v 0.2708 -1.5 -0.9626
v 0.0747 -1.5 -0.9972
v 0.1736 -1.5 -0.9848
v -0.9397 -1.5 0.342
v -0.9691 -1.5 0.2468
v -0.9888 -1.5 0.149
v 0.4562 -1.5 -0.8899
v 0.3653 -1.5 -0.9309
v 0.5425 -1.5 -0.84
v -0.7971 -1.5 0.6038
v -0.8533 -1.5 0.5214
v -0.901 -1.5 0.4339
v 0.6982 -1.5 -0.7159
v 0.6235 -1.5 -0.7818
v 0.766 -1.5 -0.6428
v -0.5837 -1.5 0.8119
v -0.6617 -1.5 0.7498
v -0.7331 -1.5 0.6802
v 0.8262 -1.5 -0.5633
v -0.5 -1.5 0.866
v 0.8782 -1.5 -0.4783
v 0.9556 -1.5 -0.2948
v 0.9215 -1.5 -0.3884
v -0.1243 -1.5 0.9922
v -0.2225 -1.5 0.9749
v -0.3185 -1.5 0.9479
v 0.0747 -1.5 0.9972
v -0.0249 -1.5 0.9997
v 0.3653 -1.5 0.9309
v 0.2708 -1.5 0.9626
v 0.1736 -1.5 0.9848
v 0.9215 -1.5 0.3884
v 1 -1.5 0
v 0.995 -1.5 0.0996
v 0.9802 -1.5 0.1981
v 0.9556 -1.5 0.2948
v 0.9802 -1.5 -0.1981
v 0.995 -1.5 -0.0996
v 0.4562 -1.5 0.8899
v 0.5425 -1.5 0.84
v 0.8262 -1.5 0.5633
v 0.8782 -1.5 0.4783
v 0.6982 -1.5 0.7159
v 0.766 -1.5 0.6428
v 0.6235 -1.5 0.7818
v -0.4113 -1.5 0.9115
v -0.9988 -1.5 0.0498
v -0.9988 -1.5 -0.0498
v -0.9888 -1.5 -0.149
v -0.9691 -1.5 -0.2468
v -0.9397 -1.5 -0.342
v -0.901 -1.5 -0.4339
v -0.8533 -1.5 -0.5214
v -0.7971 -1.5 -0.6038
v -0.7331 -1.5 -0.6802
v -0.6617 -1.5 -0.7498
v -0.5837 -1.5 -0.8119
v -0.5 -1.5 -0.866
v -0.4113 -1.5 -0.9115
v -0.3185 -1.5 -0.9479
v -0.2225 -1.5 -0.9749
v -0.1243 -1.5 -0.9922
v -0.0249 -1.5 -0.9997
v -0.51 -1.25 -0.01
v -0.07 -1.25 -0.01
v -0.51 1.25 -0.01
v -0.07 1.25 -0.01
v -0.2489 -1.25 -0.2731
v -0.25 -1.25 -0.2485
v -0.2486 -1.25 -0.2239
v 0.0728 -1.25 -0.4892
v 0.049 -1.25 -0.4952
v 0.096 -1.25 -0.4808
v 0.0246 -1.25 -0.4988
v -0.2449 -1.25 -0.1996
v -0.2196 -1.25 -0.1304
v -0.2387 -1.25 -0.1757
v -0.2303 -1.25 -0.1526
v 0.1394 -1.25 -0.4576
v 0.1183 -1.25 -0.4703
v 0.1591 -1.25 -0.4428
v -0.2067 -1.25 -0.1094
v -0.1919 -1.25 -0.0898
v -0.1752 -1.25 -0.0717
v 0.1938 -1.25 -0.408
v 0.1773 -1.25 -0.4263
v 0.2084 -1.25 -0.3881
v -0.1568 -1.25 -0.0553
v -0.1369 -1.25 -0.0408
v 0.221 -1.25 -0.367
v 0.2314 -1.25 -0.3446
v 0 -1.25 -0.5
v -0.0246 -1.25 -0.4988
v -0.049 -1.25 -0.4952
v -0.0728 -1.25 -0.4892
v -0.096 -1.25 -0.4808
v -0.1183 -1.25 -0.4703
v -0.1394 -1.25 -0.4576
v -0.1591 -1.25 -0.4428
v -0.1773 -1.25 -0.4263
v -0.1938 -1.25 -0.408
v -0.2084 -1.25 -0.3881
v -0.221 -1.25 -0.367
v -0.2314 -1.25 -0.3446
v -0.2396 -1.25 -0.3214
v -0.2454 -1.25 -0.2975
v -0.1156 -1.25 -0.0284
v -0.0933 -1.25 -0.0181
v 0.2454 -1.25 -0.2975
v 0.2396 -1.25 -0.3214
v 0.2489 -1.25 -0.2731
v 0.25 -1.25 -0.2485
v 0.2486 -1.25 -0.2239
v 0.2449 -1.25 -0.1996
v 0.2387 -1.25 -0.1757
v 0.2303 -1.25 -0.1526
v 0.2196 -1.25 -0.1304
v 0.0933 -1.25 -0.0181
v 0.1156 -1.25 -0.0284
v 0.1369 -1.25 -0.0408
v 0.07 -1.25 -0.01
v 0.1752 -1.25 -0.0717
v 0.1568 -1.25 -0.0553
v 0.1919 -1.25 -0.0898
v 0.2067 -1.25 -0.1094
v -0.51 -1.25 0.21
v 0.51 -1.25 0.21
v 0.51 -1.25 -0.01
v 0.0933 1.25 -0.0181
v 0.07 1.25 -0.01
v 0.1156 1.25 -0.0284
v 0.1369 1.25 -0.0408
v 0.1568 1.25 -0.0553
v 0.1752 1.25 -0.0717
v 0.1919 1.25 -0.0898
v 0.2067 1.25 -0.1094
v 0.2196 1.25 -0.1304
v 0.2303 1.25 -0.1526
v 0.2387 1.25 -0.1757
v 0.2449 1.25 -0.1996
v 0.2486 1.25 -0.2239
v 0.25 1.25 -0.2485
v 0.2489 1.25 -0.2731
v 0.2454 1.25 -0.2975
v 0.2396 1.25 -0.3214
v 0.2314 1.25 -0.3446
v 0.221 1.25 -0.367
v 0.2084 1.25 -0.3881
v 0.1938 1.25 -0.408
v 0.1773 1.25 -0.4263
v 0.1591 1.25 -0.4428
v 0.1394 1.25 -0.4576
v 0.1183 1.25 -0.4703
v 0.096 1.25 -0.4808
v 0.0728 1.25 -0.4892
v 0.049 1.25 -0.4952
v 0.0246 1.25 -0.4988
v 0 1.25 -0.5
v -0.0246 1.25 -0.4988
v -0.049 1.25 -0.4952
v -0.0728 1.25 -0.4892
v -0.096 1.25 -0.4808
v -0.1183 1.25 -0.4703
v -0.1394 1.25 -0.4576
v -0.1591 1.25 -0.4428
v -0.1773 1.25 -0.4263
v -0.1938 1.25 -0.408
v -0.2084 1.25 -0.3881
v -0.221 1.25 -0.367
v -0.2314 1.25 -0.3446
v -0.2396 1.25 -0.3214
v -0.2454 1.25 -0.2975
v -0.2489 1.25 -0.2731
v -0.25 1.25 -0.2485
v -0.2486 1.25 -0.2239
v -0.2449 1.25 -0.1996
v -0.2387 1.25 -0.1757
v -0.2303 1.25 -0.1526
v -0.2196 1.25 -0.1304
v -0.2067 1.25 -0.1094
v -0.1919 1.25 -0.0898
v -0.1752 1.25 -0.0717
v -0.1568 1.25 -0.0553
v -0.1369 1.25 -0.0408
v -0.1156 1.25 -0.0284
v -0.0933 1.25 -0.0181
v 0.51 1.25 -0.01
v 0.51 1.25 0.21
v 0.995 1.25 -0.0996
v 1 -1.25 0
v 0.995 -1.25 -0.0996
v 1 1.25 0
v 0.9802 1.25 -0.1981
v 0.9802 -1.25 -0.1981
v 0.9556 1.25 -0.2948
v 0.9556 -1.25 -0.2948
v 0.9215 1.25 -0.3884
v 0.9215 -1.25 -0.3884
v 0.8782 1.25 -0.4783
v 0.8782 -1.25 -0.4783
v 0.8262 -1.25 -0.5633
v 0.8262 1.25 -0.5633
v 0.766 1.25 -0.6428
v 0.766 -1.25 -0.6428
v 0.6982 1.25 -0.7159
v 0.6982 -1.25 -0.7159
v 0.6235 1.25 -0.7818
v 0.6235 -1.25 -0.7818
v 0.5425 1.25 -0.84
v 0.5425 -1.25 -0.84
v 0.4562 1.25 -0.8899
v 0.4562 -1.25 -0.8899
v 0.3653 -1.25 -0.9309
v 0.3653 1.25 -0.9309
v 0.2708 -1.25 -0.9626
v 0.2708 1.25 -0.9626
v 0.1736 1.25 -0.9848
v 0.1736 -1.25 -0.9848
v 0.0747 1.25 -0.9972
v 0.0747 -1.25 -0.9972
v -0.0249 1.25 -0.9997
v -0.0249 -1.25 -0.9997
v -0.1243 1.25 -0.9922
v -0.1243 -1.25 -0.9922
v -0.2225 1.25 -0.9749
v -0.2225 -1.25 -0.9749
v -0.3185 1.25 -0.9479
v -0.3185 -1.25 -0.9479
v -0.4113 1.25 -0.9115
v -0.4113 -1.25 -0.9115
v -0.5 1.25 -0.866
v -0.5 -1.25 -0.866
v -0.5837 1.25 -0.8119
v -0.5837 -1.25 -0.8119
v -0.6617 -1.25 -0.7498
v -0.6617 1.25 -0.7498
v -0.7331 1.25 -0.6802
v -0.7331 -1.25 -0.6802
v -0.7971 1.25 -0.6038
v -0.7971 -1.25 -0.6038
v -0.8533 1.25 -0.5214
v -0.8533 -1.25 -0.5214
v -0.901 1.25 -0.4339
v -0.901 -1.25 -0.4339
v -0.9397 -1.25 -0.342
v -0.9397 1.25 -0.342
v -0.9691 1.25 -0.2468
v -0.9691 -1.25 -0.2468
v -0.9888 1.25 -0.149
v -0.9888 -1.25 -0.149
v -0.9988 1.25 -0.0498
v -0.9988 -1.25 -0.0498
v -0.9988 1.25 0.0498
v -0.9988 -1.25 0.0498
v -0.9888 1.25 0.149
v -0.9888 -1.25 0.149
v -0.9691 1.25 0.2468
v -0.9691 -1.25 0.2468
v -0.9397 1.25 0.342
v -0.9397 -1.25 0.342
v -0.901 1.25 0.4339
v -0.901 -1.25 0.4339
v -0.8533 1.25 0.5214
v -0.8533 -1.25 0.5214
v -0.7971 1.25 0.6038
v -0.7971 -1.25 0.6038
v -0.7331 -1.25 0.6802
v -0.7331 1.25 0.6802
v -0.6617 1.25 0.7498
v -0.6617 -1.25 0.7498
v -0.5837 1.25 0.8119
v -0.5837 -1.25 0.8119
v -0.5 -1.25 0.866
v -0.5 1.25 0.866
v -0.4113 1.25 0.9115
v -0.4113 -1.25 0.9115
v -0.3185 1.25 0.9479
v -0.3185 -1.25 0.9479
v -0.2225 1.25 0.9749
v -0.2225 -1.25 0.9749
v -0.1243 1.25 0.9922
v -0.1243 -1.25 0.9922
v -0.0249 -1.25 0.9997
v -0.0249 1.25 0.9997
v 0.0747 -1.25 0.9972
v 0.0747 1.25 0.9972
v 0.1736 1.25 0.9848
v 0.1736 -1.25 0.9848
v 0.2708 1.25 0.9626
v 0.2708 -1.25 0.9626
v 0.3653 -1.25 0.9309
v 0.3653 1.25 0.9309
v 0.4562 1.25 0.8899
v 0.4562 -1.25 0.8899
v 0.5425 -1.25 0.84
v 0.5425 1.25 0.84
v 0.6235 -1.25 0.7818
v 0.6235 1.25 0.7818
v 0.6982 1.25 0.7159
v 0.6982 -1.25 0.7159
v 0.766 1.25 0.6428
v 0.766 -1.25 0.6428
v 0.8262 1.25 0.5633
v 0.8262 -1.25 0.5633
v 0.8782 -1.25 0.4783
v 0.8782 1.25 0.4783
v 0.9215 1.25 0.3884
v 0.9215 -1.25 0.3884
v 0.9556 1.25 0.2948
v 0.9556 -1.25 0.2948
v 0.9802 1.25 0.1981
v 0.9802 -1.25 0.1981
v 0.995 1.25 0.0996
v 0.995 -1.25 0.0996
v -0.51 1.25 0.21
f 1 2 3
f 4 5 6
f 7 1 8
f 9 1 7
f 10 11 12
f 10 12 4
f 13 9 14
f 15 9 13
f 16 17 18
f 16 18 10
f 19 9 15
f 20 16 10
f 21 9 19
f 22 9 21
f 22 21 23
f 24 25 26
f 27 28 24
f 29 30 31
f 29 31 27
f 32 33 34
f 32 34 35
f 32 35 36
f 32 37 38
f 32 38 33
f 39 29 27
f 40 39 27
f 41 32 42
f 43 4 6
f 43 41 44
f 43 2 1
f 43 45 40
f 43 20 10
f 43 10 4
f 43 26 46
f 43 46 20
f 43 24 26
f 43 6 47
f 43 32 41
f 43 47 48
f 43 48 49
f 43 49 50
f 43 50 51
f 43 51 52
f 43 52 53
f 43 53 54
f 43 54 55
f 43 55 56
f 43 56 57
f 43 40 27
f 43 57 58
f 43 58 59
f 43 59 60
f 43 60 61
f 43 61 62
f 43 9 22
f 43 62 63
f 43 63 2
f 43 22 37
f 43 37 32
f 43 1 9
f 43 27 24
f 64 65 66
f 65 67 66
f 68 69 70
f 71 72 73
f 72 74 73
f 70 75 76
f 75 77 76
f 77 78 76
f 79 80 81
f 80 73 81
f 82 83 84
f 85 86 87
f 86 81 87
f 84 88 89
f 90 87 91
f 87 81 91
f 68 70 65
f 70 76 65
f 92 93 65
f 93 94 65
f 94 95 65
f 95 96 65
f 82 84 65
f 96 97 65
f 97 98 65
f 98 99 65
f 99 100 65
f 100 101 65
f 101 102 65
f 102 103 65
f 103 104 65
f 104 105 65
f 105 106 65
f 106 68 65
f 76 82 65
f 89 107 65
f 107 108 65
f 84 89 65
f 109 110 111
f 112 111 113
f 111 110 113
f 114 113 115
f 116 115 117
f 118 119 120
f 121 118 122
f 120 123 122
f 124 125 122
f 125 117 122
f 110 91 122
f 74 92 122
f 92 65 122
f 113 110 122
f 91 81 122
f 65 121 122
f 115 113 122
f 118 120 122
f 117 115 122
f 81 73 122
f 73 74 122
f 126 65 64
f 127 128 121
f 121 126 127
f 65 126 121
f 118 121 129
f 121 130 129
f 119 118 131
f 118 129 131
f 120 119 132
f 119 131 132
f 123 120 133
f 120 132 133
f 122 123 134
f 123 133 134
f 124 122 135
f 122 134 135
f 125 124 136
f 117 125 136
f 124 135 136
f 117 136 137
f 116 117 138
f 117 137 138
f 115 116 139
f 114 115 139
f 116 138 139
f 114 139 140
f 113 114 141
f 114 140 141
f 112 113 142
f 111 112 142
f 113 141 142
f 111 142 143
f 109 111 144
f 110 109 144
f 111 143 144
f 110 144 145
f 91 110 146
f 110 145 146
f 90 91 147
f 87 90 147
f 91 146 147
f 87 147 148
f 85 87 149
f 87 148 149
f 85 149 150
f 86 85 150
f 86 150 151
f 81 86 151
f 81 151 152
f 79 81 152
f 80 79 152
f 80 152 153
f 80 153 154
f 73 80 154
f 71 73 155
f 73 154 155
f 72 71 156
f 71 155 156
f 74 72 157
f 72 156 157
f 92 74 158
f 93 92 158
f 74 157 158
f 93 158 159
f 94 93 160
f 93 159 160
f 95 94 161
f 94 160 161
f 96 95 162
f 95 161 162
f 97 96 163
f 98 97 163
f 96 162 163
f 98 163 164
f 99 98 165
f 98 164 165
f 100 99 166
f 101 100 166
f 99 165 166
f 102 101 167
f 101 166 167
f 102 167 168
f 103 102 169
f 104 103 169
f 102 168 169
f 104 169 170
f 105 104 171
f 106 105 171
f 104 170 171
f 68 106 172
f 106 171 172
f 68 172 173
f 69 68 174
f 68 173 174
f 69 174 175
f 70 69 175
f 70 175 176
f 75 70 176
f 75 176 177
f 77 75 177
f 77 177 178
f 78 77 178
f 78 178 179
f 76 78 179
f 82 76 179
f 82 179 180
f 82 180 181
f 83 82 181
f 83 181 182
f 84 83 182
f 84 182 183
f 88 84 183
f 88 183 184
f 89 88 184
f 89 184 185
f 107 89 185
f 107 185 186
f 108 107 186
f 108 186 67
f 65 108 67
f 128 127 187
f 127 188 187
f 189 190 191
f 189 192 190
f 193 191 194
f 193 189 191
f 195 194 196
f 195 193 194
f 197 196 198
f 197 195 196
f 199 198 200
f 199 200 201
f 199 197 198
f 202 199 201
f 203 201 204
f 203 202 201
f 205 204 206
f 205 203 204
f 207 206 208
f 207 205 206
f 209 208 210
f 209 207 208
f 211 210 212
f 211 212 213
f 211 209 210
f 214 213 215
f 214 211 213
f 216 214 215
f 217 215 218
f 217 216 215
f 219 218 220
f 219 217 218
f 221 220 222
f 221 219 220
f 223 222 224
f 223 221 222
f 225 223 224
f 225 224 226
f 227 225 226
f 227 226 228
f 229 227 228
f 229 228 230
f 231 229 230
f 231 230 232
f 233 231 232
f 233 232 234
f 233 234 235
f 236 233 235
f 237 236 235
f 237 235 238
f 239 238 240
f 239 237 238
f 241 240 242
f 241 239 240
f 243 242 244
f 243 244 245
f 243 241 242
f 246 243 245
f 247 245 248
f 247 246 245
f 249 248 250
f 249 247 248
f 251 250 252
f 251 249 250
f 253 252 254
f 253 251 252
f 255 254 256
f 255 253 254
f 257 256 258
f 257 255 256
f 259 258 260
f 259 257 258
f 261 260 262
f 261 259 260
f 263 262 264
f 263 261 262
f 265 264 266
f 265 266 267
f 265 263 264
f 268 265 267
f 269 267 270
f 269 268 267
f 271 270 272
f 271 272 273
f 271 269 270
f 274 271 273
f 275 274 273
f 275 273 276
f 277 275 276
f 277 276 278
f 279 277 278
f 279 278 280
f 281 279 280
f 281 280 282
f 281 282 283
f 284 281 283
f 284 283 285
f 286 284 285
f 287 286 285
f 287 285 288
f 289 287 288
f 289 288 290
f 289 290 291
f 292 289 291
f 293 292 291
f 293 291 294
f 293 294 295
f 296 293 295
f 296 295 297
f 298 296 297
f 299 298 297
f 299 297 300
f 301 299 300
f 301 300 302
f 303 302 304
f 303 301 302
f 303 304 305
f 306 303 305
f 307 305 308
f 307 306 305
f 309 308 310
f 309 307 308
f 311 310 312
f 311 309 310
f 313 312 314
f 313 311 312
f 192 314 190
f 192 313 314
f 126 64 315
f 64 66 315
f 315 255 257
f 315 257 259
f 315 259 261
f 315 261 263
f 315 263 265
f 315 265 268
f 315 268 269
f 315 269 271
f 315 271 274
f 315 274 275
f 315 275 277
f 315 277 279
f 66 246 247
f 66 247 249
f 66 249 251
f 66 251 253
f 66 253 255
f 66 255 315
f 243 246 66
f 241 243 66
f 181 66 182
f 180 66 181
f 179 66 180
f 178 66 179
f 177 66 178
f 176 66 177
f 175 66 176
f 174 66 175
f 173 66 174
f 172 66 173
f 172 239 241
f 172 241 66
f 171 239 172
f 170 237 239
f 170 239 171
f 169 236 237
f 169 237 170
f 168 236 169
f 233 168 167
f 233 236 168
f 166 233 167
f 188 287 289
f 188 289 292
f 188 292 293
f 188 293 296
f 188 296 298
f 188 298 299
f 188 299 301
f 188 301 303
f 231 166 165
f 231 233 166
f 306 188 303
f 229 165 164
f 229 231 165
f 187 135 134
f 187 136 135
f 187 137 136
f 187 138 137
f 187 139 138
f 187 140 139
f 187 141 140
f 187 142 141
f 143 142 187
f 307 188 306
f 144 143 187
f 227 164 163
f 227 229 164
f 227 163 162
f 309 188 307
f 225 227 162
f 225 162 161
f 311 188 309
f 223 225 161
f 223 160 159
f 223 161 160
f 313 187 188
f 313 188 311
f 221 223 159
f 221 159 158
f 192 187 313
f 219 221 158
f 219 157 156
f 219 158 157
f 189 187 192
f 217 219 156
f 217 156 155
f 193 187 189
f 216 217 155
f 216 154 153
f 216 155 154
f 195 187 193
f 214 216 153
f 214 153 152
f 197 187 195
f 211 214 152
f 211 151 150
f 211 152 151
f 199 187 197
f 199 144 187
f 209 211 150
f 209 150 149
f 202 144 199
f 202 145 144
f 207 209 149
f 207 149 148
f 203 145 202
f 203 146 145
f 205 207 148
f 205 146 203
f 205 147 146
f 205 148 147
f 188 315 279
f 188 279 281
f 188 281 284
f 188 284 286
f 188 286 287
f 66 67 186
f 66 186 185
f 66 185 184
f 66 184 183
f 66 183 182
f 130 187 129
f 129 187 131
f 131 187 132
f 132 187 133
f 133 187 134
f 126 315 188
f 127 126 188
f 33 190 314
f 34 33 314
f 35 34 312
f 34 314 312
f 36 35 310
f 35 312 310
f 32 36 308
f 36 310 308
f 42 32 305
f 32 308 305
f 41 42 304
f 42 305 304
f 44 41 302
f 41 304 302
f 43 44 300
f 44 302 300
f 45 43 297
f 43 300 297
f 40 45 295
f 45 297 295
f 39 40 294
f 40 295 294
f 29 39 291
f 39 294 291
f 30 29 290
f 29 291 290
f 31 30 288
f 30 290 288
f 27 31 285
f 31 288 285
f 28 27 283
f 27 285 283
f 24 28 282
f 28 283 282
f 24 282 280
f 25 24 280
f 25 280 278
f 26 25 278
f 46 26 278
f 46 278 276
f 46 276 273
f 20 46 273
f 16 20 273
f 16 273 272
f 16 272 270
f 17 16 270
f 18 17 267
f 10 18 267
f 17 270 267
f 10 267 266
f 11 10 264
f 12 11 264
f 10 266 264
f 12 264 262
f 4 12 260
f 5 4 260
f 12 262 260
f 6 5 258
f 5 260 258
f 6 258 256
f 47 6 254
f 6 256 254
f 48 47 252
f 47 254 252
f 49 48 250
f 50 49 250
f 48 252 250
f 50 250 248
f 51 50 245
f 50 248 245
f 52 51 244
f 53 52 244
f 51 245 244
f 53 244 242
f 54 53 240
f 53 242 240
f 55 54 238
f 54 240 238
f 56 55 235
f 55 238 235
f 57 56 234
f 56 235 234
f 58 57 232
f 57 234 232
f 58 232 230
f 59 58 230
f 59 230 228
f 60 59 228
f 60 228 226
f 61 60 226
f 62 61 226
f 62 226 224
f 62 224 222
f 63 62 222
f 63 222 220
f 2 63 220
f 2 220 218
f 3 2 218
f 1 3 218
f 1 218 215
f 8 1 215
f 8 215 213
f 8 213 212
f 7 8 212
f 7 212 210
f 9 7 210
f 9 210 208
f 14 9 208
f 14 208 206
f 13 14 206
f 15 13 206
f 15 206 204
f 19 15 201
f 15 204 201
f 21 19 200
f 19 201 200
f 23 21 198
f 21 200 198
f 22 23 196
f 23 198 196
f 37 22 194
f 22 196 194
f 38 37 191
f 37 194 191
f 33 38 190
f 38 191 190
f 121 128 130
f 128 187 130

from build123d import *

# Parameters (mm, degrees)
SKETCH1_R           = 1
BOSS_EXTRUDE1_DEPTH = 1.25
SKETCH3_R           = 1
BOSS_EXTRUDE2_DEPTH = 0.25


with BuildPart() as part:
    # Sketch1 → Boss-Extrude1 (new body, symmetric)
    with BuildSketch(Plane(origin=(0, 0, 0), x_dir=(1, 0, 0), z_dir=(0, 1, 0))):
        Circle(SKETCH1_R)
        with BuildLine():
            Line((-0.51, -0.21), (0.51, -0.21))
            Line((0.51, -0.21), (0.51, 0.01))
            Line((0.51, 0.01), (0.07, 0.01))
            ThreePointArc((0.07, 0.01), (0, 0.5), (-0.07, 0.01))
            Line((-0.07, 0.01), (-0.51, 0.01))
            Line((-0.51, 0.01), (-0.51, -0.21))
        make_face(mode=Mode.SUBTRACT)
    extrude(amount=BOSS_EXTRUDE1_DEPTH, both=True)

    # Sketch3 → Boss-Extrude2 (add)
    with BuildSketch(Plane.XZ.offset(1.25)):
        Circle(SKETCH3_R)
    extrude(amount=BOSS_EXTRUDE2_DEPTH)


solid = part.part
